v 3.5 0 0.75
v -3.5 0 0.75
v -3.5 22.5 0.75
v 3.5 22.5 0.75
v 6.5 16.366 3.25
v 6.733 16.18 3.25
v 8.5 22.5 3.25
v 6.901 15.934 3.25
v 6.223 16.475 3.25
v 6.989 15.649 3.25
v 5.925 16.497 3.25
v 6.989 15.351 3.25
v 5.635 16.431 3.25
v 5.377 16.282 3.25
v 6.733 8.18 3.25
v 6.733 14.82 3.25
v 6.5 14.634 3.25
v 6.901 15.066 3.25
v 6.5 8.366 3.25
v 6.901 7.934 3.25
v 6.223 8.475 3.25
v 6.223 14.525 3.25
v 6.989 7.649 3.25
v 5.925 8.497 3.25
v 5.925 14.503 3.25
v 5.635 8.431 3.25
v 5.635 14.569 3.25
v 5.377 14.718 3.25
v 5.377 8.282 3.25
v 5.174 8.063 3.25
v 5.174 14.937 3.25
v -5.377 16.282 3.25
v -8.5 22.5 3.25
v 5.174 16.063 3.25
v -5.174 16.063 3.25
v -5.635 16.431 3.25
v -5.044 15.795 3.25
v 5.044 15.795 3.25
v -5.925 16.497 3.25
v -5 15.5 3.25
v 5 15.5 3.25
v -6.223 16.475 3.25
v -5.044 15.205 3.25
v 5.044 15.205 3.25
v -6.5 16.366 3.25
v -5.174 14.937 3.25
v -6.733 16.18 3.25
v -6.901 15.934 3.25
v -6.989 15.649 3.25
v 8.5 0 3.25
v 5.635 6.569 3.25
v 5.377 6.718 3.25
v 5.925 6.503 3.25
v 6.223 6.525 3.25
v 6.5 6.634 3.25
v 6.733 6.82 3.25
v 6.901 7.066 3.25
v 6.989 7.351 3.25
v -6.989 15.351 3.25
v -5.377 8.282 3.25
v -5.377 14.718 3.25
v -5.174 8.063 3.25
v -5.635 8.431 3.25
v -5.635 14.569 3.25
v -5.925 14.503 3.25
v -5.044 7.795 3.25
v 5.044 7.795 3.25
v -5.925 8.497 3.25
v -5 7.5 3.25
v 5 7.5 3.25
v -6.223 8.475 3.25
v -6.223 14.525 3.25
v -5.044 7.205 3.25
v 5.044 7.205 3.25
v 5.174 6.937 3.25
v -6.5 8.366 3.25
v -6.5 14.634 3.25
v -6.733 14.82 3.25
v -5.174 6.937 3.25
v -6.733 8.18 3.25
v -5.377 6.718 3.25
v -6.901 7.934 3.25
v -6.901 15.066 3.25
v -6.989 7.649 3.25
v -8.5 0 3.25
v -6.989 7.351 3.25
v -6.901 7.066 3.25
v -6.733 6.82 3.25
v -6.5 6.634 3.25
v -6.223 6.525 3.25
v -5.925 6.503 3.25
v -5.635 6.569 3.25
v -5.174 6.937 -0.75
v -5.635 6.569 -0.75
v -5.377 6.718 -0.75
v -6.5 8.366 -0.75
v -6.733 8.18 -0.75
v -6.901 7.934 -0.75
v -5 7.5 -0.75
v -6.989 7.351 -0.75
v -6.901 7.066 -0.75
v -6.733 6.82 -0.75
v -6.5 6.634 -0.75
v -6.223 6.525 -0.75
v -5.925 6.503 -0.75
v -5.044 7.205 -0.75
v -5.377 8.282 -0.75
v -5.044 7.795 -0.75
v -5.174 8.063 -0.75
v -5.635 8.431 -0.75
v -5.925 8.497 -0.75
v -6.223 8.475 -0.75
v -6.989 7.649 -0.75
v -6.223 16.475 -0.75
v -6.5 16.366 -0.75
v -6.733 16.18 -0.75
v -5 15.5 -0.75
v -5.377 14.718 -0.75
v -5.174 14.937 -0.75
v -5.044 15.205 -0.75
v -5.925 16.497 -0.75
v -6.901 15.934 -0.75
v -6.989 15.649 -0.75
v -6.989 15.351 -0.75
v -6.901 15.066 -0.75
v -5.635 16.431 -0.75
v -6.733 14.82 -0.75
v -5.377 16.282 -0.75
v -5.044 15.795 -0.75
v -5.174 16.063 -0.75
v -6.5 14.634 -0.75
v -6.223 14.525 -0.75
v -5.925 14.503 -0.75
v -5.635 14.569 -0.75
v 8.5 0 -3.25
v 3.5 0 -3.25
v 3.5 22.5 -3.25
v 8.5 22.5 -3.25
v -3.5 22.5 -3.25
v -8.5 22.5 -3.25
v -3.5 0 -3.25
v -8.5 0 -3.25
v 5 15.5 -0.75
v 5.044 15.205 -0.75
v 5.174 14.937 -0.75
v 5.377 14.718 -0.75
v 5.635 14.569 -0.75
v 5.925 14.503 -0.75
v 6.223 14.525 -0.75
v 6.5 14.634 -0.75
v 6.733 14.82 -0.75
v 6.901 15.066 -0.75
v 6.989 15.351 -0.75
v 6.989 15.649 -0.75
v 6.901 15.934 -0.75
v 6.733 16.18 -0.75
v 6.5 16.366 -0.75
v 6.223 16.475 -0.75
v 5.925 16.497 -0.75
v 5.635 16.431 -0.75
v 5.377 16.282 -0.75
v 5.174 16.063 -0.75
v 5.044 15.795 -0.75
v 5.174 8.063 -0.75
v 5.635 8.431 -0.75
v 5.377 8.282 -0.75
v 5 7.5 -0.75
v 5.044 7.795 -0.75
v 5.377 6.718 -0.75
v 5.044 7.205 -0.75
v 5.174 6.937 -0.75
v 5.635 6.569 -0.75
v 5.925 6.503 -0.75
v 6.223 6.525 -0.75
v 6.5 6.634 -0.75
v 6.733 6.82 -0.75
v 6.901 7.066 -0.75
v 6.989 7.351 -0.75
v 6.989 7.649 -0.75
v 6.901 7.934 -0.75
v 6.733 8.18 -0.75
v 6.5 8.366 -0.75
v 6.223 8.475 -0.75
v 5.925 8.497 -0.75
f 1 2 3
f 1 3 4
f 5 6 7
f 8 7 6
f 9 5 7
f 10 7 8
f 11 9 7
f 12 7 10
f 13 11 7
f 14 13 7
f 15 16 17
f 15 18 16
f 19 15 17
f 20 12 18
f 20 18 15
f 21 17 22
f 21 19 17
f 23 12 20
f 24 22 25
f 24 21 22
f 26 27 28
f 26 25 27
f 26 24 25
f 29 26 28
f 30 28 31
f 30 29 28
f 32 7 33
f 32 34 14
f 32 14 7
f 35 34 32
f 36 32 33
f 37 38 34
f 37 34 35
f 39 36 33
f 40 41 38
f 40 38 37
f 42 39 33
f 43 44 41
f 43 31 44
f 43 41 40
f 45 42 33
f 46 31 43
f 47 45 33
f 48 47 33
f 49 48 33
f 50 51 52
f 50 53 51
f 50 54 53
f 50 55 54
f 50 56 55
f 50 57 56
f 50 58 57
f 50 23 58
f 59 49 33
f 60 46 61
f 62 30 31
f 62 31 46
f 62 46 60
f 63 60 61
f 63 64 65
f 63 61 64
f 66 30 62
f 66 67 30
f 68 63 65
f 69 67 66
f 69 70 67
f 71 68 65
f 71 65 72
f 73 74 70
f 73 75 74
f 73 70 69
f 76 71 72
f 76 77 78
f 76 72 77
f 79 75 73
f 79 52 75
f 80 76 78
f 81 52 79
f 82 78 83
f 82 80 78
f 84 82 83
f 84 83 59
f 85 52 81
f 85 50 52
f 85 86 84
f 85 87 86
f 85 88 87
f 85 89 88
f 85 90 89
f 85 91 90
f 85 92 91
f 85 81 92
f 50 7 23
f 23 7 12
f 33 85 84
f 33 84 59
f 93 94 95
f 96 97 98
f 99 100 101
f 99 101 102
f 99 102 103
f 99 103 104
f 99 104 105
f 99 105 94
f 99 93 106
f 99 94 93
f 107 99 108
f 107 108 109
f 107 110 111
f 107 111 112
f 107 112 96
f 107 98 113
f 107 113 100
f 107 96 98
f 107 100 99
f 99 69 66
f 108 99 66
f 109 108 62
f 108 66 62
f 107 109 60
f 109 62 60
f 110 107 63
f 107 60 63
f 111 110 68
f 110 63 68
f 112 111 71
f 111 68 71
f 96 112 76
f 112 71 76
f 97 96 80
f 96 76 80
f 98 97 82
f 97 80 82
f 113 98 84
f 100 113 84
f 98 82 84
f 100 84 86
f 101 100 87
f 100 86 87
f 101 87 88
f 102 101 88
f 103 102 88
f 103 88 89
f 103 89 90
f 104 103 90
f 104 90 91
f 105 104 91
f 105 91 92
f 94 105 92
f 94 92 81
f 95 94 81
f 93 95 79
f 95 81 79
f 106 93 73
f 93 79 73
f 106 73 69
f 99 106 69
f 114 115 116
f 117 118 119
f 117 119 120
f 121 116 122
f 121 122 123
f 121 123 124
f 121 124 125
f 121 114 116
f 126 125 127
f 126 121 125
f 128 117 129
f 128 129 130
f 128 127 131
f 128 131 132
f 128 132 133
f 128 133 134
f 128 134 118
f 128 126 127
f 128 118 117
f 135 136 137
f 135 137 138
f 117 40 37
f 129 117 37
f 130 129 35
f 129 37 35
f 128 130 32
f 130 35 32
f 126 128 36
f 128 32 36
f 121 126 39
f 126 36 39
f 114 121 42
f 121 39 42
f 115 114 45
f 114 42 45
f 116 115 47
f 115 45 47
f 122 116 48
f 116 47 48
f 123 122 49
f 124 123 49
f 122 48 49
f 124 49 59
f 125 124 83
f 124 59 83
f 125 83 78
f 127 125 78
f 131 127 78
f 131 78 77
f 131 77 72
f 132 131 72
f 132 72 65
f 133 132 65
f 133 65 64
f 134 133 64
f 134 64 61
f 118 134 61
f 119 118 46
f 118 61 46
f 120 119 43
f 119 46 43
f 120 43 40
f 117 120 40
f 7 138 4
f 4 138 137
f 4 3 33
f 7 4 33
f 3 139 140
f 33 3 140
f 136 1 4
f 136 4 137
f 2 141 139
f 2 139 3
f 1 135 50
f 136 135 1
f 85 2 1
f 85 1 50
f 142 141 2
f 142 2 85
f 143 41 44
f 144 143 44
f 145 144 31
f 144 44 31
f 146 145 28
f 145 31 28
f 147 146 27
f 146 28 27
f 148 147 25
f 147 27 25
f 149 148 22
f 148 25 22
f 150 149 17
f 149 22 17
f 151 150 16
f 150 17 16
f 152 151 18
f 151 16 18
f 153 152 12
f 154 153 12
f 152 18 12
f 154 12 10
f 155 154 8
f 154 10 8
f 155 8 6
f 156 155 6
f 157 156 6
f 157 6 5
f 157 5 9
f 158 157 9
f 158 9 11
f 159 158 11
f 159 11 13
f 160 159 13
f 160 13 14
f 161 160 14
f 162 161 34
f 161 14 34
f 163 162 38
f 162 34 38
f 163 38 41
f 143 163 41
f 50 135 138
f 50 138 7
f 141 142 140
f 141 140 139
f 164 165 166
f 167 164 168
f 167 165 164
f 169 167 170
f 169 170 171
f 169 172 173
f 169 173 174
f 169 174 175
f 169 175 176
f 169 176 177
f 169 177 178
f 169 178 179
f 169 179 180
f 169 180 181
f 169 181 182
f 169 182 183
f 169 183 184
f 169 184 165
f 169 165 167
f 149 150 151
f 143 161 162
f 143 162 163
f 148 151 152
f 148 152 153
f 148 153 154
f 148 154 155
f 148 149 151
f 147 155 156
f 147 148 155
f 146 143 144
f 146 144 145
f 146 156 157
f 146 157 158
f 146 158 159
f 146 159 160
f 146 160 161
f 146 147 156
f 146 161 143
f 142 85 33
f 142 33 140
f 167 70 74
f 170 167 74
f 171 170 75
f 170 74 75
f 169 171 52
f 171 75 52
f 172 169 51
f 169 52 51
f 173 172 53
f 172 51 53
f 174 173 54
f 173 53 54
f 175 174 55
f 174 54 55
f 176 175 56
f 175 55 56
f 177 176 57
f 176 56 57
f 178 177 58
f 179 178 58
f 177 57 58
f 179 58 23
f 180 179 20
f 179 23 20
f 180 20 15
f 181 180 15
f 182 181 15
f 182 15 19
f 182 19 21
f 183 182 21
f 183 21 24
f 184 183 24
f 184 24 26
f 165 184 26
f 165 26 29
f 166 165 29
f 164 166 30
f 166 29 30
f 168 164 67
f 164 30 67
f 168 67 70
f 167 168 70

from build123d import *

# Parameters (mm, degrees)
EXTRUDE_1_DEPTH     = 22.5
SKETCH_2_R          = 1
CUT_EXTRUDE_1_DEPTH = 4


with BuildPart() as part:
    # 草图1 → 凸台-拉伸1 (new body)
    with BuildSketch(Plane(origin=(0, 0, 0), x_dir=(1, 0, 0), z_dir=(0, 1, 0))):
        Polygon((-3.5, -0.75), (3.5, -0.75), (3.5, 3.25), (8.5, 3.25), (8.5, -3.25), (-8.5, -3.25), (-8.5, 3.25), (-3.5, 3.25), align=None)
    extrude(amount=EXTRUDE_1_DEPTH)

    # 草图2 → 切除-拉伸1 (cut)
    with BuildSketch(Plane.XY.offset(3.25)):
        with Locations((-6, 15.5)):
            Circle(SKETCH_2_R)
        with Locations((-6, 7.5)):
            Circle(SKETCH_2_R)
        with Locations(Location((6, 7.5, 0), (0, 0, 180))):
            Circle(SKETCH_2_R)
        with Locations(Location((6, 15.5, 0), (0, 0, 180))):
            Circle(SKETCH_2_R)
    extrude(amount=-CUT_EXTRUDE_1_DEPTH, mode=Mode.SUBTRACT)


solid = part.part
